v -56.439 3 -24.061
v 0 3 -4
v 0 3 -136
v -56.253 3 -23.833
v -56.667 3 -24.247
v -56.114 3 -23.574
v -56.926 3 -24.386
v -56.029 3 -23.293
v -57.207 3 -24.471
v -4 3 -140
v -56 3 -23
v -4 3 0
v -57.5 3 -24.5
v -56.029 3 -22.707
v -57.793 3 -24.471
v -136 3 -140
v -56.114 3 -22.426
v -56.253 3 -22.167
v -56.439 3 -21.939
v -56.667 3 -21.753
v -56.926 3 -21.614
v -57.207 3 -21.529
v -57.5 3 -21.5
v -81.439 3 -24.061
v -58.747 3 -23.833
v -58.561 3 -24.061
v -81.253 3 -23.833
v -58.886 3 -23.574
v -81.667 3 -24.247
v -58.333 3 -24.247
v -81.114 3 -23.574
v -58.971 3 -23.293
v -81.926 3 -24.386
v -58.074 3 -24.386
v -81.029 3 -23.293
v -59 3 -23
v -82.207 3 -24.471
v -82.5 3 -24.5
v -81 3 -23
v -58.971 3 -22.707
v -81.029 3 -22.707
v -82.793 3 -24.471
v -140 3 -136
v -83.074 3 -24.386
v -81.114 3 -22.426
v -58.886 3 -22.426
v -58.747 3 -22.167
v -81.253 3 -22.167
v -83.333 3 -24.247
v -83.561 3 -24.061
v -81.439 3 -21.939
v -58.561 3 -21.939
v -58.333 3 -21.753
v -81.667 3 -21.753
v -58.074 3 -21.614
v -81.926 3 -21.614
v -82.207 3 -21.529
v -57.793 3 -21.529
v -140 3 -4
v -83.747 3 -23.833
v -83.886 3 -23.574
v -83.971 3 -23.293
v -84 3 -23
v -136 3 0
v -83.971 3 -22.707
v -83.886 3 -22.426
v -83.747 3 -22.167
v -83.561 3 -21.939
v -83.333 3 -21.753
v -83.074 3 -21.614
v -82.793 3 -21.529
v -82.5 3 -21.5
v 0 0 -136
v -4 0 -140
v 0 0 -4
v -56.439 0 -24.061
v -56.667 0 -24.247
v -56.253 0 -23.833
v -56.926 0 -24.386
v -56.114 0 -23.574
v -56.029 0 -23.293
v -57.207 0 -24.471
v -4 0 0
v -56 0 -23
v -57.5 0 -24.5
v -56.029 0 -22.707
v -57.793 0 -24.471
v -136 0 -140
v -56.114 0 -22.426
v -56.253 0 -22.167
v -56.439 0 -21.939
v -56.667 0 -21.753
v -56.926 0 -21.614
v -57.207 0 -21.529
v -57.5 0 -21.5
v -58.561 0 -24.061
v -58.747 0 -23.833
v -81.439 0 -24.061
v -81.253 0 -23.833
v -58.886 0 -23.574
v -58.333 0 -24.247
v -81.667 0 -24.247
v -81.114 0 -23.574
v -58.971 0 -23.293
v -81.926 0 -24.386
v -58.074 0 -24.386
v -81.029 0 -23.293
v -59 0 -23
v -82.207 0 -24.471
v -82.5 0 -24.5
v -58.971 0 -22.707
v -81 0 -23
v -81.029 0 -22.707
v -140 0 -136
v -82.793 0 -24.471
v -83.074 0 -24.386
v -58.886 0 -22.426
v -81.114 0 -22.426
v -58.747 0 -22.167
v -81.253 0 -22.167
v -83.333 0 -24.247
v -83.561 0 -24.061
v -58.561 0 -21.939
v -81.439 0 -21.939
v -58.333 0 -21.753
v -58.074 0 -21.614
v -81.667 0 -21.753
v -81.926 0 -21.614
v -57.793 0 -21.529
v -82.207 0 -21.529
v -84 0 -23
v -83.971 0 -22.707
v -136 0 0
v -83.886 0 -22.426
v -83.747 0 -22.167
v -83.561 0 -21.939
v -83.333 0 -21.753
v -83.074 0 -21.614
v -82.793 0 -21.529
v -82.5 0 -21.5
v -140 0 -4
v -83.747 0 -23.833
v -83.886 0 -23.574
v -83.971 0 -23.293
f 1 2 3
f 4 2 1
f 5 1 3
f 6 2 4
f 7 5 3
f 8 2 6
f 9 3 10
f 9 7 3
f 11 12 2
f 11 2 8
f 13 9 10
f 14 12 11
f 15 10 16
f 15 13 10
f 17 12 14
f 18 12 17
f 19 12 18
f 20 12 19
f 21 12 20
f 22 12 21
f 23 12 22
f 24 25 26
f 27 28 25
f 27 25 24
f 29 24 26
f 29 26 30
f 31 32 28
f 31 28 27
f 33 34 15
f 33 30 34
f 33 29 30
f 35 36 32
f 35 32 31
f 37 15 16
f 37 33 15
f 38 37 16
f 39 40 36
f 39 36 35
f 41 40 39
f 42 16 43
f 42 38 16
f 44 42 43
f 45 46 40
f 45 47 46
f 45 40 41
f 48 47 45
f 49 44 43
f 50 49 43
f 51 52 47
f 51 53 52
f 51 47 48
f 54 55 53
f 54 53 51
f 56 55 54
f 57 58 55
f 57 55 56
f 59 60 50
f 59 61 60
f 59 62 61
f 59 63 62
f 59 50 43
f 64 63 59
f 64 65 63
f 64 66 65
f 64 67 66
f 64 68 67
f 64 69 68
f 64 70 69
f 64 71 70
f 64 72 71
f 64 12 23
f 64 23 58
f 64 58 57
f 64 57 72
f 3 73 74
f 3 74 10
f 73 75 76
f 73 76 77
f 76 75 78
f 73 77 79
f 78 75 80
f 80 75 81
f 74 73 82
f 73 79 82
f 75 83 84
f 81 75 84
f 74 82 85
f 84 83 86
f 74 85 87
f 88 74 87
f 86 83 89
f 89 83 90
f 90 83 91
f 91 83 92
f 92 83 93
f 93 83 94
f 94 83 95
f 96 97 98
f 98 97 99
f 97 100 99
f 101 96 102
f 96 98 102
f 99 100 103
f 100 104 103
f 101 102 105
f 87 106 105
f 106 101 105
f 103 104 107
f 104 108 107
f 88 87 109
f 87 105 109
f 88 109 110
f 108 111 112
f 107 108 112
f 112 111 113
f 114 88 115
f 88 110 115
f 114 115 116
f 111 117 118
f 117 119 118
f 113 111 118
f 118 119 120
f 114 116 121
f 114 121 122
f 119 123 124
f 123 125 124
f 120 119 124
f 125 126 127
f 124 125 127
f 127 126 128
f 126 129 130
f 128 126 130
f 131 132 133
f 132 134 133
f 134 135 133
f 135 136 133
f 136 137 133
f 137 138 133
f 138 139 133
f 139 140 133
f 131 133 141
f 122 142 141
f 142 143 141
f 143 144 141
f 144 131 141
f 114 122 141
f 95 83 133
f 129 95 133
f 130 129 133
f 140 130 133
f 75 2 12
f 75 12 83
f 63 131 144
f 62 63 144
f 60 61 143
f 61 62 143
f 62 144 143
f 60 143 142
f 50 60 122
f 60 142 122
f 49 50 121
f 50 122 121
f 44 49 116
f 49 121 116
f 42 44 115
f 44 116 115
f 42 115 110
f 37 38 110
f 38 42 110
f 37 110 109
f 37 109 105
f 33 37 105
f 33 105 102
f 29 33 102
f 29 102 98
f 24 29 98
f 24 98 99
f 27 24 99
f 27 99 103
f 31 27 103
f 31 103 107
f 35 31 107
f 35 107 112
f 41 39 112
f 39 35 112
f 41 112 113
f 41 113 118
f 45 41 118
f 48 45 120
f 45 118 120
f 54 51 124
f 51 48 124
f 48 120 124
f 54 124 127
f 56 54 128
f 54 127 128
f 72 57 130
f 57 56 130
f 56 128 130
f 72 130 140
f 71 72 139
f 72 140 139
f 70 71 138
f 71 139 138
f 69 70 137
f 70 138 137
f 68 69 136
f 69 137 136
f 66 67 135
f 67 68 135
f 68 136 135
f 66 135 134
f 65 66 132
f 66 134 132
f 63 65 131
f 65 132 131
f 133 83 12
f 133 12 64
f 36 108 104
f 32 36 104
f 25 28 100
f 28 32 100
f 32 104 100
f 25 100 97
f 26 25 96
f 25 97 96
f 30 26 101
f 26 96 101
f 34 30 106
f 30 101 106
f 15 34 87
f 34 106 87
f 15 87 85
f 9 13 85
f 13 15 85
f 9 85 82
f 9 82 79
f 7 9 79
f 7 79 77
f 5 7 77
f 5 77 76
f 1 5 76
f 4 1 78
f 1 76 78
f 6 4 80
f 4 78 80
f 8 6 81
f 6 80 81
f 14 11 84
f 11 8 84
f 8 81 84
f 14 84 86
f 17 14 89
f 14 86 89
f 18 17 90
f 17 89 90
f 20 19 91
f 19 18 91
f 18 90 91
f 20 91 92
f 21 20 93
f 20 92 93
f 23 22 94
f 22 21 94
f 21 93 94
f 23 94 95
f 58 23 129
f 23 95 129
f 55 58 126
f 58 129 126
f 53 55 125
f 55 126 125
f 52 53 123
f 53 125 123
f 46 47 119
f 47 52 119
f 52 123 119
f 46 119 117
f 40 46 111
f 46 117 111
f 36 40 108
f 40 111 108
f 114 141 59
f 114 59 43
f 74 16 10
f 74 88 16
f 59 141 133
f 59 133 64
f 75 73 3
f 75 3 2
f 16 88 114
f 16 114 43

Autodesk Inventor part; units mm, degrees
ref_plane "YZ Plane" through (0, 0, 0) normal (1, 0, 0) x (0, 1, 0)
ref_plane "XZ Plane" through (0, 0, 0) normal (0, 1, 0) x (-1, 0, 0)
ref_plane "XY Plane" through (0, 0, 0) normal (0, 0, 1) x (1, 0, 0)
sketch "Sketch1" plane through (0, 0, 0) normal (0, 1, 0) x (-1, 0, 0)
  line L0 (0, 0) -> (140, 0)
  line L1 (140, 0) -> (140, -140)
  line L2 (140, -140) -> (0, -140)
  line L3 (0, -140) -> (0, 0)
  circle A0 centre (82.5, -23) radius 1.5
  circle A1 centre (57.5, -23) radius 1.5
  line L4 (82.5, -23) -> (57.5, -23) construction
  point P0 (70, -23)
  point P1 (70, 0)
  dimension "d0" = 140
  dimension "d1" = 140
  dimension "d2" = 3
  dimension "d3" = 23
  dimension "d4" = 25
extrude "Extrusion1" add sketch "Sketch1" along normal blind 3
chamfer "Chamfer1" distance 4 angle 45 4 edges at (-140, 1.5, 0) (-140, 1.5, -140) (0, 1.5, -140) (0, 1.5, 0)
properties part number "table"
